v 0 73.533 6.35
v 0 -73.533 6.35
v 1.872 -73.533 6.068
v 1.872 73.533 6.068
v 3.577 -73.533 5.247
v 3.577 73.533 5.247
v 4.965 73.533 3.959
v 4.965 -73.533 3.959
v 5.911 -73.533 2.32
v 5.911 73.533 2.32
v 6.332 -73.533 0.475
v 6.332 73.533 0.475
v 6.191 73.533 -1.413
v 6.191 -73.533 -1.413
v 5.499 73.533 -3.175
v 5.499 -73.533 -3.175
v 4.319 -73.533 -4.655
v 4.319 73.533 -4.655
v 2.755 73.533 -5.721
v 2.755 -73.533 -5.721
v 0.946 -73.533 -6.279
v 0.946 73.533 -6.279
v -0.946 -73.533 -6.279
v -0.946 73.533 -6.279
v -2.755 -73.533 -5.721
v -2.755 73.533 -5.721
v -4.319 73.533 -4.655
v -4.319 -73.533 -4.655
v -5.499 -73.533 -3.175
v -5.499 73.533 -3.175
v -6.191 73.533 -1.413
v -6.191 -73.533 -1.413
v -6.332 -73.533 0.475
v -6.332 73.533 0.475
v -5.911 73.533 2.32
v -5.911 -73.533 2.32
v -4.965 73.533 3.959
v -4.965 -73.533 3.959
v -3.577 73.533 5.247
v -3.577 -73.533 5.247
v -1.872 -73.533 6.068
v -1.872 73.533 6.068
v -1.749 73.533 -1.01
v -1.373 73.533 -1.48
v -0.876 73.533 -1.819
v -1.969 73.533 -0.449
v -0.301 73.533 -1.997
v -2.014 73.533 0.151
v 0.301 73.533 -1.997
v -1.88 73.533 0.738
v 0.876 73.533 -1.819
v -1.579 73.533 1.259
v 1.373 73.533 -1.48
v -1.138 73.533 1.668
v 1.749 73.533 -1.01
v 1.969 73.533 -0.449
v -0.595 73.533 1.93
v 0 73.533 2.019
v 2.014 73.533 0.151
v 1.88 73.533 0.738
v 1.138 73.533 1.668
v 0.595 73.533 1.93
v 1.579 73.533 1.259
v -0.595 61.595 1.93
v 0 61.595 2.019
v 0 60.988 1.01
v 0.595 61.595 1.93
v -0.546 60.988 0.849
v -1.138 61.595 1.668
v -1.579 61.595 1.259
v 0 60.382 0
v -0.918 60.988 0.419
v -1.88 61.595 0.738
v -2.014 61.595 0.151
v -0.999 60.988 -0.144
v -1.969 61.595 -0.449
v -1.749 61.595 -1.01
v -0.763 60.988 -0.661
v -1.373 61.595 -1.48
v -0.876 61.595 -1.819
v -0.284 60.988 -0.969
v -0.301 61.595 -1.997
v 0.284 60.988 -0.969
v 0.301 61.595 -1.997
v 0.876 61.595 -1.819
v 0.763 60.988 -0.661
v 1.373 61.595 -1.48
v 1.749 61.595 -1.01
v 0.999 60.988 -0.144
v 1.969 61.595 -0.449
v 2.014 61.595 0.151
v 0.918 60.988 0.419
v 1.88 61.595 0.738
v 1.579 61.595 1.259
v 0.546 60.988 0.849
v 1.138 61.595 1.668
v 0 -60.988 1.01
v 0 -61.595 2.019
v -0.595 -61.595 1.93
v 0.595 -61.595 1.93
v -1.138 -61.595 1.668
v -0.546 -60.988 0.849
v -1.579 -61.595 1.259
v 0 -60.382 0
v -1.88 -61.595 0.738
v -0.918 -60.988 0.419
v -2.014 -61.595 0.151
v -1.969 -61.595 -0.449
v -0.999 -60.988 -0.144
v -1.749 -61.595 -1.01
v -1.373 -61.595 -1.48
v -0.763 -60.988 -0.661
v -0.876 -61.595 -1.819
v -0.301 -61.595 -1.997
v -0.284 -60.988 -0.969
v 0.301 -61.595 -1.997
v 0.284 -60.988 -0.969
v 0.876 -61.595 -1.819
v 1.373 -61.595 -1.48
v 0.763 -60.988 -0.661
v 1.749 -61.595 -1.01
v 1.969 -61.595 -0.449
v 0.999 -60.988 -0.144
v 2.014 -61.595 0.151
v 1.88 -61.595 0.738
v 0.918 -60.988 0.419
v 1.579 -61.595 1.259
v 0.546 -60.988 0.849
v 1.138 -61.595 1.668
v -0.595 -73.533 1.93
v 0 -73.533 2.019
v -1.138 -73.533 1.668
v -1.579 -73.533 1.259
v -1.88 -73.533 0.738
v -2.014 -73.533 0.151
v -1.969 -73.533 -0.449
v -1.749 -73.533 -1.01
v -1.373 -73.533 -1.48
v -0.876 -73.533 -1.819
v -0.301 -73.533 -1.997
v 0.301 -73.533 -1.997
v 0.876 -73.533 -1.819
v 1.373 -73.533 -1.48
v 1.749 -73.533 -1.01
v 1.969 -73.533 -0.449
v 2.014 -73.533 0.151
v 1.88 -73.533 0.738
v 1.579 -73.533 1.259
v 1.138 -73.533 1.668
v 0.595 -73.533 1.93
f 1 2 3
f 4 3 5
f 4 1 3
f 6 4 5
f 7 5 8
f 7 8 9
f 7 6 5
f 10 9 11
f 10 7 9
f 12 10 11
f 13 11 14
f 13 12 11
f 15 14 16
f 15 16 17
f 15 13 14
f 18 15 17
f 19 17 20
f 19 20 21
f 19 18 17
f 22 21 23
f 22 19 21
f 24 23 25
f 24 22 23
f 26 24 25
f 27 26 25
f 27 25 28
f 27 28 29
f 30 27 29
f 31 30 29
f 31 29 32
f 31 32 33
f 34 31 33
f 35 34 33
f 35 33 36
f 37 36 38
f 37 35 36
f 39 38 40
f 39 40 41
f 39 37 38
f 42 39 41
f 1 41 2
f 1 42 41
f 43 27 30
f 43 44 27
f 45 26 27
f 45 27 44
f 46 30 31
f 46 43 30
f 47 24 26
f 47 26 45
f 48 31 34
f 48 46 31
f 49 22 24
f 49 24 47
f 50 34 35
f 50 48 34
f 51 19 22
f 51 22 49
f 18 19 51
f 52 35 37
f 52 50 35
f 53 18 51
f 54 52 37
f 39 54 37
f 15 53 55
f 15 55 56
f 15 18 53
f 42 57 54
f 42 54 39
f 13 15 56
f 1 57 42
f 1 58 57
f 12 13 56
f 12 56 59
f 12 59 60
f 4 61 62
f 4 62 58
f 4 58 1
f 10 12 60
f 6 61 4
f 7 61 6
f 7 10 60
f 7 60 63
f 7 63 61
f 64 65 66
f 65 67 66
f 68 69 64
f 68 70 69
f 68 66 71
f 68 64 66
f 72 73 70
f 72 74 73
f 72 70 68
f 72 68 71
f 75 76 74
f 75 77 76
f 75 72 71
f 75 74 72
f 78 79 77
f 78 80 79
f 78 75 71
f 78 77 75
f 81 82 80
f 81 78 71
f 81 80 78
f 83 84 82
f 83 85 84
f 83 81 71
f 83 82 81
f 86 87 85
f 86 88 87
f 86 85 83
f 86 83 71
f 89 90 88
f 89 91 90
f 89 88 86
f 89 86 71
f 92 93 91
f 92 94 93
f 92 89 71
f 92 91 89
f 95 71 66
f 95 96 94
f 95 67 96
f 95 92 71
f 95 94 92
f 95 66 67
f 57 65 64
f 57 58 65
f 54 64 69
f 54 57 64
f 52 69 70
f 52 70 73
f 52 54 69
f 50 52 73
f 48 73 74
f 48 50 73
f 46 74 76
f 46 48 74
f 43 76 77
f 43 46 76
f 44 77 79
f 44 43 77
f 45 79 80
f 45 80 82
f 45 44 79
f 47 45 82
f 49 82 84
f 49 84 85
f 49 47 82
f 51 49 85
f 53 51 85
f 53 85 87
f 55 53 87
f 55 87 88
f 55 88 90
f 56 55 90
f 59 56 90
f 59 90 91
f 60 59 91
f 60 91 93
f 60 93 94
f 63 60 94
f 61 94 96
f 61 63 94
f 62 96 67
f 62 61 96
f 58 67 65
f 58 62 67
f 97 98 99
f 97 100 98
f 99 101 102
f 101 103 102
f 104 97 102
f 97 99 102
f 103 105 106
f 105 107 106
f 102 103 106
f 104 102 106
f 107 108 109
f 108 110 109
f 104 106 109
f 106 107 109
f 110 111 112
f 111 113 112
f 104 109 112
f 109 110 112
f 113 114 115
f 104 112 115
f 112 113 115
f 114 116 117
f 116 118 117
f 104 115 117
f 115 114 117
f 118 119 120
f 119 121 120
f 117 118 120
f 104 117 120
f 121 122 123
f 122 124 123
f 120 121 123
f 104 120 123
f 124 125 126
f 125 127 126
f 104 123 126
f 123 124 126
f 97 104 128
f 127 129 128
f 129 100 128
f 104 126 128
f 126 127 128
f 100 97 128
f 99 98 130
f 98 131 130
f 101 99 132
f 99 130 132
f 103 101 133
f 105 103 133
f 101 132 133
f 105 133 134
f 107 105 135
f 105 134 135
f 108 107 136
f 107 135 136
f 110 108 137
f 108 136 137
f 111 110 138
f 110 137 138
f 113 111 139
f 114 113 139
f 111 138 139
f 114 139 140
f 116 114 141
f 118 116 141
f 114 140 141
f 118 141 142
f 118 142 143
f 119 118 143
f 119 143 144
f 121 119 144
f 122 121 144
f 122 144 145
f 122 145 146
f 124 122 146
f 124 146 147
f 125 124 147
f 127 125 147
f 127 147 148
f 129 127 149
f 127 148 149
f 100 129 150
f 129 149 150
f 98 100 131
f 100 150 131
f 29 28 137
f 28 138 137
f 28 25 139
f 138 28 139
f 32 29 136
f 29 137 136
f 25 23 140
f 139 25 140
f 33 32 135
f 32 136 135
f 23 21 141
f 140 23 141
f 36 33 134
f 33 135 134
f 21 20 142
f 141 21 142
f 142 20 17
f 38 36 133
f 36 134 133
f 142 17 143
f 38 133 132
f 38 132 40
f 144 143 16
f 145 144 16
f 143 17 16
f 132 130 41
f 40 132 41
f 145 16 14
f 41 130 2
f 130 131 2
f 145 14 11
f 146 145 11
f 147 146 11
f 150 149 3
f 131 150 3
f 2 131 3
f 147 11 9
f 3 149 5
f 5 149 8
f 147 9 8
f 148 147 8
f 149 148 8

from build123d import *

# Parameters (mm, degrees)
SKETCH1_R           = 6.35
BOSS_EXTRUDE1_DEPTH = 73.533


with BuildPart() as part:
    # Sketch1 → Boss-Extrude1 (new, symmetric)
    with BuildSketch(Plane(origin=(0, 0, 0), x_dir=(1, 0, 0), z_dir=(0, 1, 0))):
        with Locations(Location((0, 0, 0), (0, 0, 270))):
            Circle(SKETCH1_R)
    extrude(amount=BOSS_EXTRUDE1_DEPTH, both=True)

    # Sketch2 → #10-32 Tapped Hole1 (revolve, cut)
    with BuildSketch(Plane(origin=(0, 73.533, 0), x_dir=(0, 0, 1), z_dir=(1, 0, 0))):
        Polygon((0, 0), (0, 13.151317848), (2.0193, 11.938), (2.0193, 0), align=None)
    f_10_32_tapped_hole1 = revolve(axis=Axis((0, 79.883, 0), (0, -1, 0)), mode=Mode.SUBTRACT)

    # Mirror1: #10-32 Tapped Hole1 across plane
    add(f_10_32_tapped_hole1.mirror(Plane.ZX), mode=Mode.SUBTRACT)


solid = part.part
